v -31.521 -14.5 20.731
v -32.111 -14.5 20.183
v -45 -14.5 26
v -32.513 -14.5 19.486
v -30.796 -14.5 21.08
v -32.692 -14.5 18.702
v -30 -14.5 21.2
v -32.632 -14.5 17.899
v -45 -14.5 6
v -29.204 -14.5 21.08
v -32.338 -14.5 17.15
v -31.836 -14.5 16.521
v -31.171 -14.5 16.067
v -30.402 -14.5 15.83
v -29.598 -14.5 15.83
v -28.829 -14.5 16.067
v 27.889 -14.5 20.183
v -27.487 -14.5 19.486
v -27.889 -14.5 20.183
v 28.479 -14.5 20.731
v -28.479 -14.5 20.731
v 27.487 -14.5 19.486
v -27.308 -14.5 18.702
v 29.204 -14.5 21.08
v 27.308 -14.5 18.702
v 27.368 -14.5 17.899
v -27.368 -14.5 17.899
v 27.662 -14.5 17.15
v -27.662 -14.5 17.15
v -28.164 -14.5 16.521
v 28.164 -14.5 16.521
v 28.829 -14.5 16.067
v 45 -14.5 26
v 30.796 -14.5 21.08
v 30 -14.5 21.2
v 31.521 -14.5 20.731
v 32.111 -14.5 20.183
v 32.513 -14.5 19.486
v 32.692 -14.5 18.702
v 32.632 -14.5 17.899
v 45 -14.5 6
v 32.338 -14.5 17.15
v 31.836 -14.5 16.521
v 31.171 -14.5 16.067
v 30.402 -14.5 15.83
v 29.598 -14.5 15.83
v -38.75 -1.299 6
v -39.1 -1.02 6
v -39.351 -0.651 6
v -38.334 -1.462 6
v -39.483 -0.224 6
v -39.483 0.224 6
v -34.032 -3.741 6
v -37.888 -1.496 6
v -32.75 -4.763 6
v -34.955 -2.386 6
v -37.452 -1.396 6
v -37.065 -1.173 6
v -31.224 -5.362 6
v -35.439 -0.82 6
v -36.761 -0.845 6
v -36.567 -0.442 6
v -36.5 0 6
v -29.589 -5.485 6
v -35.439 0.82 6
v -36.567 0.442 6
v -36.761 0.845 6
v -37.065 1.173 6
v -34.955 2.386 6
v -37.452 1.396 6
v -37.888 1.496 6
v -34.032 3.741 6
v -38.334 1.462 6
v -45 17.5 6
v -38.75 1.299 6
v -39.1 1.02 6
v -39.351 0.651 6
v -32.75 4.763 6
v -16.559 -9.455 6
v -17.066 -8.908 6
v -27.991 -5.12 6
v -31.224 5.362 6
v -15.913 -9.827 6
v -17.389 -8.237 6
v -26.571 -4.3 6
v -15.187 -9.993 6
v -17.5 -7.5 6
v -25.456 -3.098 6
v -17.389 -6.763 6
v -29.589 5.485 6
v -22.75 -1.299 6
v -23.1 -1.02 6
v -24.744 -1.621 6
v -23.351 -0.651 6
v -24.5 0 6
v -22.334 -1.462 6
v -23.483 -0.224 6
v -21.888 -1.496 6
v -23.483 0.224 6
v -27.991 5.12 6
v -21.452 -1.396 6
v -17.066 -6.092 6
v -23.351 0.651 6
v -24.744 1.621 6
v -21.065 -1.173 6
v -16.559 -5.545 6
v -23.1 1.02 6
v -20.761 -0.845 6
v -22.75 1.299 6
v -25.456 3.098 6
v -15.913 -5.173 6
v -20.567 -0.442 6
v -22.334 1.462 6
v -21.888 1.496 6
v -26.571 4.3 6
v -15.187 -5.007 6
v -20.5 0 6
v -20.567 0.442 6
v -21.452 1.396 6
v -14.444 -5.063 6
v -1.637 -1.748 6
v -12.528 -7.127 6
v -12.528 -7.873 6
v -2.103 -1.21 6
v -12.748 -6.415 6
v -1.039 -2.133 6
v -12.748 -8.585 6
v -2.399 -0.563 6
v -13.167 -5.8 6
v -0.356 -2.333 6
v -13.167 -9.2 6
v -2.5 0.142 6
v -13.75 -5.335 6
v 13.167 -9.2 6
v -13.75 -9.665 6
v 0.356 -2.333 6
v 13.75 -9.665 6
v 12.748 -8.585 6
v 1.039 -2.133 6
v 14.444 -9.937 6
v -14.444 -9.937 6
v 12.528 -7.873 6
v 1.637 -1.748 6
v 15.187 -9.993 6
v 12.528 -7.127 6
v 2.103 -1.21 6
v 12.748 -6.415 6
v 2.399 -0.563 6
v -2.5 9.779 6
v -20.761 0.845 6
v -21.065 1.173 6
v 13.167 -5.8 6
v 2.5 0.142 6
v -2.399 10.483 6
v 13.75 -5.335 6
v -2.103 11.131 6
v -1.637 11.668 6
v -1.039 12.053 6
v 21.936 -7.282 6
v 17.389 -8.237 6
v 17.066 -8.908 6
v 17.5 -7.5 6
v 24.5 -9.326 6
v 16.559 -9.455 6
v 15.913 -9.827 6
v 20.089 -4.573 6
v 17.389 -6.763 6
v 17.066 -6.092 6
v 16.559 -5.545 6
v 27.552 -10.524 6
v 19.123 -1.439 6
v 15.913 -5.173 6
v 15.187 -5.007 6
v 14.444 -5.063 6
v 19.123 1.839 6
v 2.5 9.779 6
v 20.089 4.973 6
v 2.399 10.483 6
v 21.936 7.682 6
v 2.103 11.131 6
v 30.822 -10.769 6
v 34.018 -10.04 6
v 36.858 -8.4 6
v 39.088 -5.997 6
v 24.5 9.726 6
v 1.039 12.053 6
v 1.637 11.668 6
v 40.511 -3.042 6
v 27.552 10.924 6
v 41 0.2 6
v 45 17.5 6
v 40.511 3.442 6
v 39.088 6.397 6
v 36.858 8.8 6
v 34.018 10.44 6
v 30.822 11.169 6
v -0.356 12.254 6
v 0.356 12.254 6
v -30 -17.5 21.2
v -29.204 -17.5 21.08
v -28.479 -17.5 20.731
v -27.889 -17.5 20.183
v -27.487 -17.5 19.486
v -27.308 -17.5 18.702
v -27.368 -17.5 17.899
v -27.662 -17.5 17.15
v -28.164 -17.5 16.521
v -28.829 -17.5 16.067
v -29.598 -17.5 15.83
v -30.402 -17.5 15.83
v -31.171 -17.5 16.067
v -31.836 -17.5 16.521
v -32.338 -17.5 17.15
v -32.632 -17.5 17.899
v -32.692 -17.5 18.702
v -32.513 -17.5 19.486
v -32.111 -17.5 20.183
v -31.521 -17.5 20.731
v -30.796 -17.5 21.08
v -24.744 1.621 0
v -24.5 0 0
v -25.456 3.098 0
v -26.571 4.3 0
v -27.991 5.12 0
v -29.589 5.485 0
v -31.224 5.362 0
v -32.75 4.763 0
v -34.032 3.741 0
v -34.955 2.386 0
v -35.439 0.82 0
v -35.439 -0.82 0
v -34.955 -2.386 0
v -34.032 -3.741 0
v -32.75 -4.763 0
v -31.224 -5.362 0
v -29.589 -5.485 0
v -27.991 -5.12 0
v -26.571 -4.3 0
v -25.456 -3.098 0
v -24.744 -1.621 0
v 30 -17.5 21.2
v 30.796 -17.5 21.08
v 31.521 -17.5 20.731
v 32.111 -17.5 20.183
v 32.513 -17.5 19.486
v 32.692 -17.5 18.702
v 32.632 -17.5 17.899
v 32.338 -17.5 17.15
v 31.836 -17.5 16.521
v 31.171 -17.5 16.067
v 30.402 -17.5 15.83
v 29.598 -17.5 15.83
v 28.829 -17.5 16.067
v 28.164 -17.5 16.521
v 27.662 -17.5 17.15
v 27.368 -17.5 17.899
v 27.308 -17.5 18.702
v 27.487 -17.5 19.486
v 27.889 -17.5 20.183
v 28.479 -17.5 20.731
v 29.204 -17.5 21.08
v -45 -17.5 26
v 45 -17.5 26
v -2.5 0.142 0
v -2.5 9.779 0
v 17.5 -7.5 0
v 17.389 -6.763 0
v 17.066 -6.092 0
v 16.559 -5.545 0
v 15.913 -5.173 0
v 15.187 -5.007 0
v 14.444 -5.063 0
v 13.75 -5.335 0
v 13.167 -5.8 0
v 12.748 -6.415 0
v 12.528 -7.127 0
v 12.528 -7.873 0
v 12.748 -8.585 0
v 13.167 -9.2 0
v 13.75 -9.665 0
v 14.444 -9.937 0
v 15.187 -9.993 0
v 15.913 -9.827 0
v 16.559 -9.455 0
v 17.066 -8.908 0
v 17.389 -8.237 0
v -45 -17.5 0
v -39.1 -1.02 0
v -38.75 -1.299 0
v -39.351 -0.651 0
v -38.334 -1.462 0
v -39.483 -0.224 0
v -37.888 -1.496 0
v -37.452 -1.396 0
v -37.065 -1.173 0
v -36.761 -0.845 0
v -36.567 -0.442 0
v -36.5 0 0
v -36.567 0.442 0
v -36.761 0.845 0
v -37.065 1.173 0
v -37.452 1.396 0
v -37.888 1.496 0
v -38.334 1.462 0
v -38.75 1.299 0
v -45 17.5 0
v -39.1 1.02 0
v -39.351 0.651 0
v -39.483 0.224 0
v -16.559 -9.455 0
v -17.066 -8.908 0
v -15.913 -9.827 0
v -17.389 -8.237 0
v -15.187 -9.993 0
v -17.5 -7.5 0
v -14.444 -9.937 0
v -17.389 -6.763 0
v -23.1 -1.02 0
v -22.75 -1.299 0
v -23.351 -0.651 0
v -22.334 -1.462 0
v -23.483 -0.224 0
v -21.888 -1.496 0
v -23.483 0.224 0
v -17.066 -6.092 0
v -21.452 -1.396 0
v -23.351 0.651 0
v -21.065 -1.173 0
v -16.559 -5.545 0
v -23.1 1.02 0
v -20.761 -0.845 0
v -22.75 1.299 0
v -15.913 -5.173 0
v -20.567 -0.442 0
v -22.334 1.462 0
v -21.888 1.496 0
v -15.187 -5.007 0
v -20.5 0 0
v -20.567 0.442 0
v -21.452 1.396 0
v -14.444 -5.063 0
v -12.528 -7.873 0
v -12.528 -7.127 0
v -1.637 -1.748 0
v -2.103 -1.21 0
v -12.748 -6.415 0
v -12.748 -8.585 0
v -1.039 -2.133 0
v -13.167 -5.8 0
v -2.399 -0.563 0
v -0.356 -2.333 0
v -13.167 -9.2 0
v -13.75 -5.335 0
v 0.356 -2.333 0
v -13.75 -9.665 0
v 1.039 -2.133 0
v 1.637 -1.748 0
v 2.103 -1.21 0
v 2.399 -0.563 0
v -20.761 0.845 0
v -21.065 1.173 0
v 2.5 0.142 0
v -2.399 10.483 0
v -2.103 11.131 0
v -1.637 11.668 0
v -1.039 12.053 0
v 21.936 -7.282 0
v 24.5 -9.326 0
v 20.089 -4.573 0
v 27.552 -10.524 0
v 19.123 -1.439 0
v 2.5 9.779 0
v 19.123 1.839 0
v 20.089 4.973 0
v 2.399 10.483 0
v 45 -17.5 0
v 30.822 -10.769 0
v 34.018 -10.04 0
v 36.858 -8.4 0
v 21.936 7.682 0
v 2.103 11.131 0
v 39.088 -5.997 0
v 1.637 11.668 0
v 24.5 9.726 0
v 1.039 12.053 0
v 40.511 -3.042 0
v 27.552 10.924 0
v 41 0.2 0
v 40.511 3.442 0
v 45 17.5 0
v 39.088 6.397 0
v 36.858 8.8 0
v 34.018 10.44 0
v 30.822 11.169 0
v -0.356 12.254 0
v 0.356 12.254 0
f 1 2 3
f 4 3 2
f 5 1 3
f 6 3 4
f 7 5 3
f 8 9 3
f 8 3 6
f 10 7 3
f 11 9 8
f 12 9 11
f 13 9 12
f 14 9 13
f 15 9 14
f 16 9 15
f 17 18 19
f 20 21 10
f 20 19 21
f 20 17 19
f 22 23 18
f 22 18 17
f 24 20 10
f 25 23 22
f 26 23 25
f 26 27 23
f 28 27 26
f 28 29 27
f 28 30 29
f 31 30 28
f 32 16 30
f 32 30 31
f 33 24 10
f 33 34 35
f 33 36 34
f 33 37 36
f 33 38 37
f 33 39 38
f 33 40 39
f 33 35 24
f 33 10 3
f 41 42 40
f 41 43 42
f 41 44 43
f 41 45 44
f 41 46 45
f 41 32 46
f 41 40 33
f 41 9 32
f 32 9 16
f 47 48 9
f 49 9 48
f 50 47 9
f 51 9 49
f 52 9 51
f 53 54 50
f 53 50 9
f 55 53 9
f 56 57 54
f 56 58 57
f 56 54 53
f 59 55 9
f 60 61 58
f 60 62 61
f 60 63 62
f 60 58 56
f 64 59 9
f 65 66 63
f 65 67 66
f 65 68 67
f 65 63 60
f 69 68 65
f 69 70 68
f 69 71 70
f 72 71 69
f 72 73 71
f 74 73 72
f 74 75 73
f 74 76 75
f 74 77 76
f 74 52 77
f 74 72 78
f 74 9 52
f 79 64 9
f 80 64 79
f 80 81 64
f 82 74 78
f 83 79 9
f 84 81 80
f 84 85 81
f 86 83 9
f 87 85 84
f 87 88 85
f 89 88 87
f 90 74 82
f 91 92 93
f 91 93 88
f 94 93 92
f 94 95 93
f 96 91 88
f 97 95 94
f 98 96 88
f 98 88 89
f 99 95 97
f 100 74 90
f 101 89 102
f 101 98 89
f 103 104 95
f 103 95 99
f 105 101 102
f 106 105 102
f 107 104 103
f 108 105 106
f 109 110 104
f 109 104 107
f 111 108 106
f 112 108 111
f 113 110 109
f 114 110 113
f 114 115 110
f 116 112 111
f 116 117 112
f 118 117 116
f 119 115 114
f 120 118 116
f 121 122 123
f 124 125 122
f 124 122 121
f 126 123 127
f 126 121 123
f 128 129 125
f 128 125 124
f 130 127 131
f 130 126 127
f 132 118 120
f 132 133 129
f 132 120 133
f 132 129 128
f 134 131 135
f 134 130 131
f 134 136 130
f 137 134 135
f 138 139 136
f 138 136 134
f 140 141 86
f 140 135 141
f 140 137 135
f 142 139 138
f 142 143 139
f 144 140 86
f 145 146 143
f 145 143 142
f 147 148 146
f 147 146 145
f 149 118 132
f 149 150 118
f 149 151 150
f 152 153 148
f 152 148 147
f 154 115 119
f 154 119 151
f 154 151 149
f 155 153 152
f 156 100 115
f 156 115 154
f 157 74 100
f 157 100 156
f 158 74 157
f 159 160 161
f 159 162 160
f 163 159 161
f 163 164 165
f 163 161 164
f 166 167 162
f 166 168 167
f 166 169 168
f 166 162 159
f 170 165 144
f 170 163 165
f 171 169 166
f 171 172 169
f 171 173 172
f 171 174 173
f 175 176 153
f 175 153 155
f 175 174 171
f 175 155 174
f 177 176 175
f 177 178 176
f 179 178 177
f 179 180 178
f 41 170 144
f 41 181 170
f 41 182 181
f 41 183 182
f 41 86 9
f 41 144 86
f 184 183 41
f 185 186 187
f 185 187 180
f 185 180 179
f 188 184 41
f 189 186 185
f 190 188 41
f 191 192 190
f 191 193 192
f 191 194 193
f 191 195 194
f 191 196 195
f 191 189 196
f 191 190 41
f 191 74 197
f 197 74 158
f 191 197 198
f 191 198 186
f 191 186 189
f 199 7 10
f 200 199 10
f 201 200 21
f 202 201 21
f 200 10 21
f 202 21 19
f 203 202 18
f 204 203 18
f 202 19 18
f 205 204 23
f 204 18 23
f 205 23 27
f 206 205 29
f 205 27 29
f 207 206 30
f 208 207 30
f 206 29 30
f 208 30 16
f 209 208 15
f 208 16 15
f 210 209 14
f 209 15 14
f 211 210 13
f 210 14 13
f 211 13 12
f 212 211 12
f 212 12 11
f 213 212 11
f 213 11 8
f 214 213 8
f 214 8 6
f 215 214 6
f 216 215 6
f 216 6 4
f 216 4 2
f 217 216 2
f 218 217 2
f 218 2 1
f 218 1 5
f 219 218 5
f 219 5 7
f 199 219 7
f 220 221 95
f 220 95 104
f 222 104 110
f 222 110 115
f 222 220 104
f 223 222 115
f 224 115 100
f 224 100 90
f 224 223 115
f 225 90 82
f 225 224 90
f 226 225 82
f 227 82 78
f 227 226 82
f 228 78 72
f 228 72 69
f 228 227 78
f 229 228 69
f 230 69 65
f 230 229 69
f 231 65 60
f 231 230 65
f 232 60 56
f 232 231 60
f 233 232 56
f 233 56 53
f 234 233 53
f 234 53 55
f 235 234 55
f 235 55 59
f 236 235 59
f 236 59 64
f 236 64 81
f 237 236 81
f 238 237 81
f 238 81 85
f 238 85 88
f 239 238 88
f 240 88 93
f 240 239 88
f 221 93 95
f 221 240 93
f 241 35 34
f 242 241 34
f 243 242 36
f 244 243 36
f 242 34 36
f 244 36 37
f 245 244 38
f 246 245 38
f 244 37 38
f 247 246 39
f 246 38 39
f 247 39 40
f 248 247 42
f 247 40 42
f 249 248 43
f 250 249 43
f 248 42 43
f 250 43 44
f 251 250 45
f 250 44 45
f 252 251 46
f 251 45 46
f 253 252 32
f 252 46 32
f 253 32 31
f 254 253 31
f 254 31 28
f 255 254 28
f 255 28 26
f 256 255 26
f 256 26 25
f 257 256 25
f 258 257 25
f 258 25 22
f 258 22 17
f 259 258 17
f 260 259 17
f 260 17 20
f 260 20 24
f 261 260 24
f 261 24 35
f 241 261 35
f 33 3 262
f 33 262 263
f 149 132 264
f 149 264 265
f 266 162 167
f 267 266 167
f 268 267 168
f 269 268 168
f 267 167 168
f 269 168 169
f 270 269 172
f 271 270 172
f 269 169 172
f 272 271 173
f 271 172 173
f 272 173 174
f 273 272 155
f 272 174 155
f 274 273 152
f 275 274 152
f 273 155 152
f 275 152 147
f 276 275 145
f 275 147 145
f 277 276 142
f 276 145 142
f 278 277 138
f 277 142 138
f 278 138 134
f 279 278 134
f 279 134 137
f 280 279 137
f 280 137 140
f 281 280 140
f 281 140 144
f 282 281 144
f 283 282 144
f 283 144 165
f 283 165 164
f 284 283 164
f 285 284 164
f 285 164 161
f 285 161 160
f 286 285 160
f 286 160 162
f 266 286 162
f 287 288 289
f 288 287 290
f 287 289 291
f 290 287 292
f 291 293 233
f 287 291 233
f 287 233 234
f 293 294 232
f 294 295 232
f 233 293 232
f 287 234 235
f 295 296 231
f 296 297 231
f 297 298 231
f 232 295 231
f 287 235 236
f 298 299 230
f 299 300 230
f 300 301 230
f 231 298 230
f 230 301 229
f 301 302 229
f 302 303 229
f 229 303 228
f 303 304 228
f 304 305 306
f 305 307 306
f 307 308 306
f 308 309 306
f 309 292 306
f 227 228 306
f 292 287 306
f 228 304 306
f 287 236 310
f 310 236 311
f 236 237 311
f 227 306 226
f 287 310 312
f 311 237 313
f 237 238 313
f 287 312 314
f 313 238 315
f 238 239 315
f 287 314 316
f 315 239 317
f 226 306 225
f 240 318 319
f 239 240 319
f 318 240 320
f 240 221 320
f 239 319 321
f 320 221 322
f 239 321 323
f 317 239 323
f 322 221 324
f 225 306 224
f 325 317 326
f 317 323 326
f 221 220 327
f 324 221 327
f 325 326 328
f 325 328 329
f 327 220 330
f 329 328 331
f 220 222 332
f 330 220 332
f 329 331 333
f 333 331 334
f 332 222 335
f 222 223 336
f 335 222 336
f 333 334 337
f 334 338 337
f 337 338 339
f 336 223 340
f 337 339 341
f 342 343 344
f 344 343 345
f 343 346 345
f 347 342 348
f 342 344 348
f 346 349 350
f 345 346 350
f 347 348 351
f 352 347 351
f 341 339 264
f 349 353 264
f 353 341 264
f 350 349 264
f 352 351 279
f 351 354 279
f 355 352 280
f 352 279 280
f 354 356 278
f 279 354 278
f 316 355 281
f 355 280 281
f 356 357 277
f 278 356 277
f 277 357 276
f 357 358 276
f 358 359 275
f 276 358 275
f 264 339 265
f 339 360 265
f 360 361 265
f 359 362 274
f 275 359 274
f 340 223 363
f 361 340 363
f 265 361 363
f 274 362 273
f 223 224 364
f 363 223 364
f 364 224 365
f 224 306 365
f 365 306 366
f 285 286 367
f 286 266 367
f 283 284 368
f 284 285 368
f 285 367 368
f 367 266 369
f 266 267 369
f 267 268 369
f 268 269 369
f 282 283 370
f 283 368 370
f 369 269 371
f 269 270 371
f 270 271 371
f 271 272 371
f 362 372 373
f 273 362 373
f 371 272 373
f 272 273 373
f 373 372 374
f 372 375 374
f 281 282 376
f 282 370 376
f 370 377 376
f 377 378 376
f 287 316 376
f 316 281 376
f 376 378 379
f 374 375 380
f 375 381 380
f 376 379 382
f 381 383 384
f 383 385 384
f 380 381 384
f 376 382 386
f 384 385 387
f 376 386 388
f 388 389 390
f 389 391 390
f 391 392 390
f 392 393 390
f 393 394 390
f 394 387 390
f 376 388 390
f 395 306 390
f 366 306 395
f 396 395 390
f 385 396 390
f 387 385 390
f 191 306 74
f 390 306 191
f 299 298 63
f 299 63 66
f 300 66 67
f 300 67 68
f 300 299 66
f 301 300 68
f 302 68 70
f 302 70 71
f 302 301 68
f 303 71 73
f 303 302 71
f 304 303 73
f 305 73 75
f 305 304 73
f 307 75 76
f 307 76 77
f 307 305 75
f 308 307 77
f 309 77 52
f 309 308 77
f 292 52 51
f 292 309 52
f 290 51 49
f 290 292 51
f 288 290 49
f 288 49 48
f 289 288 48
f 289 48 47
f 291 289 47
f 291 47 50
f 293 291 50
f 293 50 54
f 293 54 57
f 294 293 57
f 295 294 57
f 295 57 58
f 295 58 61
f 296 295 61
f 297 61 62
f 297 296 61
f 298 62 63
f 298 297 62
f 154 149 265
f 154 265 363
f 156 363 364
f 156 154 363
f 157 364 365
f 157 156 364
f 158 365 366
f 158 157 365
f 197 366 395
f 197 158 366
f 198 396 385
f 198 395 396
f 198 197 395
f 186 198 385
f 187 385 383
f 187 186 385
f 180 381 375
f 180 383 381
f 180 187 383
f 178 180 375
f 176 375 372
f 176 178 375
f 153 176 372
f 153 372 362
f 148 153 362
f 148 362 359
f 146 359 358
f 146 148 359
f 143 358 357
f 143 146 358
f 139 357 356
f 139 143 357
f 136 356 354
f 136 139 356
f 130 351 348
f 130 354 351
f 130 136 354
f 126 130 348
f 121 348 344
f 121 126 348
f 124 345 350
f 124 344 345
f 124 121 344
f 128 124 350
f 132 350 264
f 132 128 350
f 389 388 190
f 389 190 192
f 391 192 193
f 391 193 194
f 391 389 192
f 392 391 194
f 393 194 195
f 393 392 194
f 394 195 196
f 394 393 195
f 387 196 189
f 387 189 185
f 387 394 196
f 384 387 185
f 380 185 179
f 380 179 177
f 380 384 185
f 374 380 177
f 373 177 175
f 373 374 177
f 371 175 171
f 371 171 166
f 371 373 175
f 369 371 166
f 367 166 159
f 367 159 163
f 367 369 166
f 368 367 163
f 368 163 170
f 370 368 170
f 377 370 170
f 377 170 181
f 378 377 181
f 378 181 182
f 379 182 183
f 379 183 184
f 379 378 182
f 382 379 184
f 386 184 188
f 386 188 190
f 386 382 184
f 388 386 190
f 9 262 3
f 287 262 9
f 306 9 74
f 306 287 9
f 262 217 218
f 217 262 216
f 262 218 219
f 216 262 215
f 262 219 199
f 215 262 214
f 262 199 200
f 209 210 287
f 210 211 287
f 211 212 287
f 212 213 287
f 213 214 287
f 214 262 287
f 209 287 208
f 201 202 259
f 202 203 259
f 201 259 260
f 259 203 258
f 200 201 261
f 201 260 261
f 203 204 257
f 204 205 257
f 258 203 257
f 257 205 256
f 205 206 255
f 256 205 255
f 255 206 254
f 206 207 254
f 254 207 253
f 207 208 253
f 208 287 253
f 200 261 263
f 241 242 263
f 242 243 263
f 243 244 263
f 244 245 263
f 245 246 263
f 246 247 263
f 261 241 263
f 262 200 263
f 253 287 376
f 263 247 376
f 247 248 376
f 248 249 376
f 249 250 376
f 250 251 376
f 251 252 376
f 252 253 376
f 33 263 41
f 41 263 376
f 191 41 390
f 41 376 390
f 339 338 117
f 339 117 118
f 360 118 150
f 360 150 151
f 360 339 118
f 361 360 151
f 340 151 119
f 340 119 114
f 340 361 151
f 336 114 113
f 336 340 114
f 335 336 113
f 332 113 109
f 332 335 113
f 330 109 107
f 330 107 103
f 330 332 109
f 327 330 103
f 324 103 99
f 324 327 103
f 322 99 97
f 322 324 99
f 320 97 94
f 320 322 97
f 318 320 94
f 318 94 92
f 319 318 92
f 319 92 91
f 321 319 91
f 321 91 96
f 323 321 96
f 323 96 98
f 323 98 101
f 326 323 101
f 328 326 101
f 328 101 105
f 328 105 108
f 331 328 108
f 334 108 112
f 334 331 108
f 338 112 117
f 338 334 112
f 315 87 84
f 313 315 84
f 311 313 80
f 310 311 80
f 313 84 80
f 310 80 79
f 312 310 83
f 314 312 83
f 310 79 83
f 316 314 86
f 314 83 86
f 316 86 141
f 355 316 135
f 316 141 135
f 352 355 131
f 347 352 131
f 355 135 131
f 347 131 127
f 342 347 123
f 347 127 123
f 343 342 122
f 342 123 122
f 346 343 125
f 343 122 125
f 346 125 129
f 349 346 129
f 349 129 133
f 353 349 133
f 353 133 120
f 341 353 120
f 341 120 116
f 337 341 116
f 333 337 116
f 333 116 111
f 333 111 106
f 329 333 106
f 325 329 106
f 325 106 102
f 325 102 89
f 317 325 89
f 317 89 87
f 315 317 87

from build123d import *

# Parameters (mm, degrees)
SKETCH1_W           = 90
SKETCH1_H           = 35
SKETCH1_R           = 5.5
SKETCH1_R_2         = 1.5
SKETCH1_R_3         = 11
BOSS_EXTRUDE1_DEPTH = 6
SKETCH2_W           = 90
SKETCH2_H           = 3
BOSS_EXTRUDE2_DEPTH = 20
SKETCH4_R           = 2.5
CUT_EXTRUDE1_DEPTH  = 10
SKETCH5_R           = 2.7
CUT_EXTRUDE2_DEPTH  = 10


with BuildPart() as part:
    # Sketch1 → Boss-Extrude1 (new body)
    with BuildSketch(Plane.XY):
        Rectangle(SKETCH1_W, SKETCH1_H)
        with Locations((-30, 0)):
            Circle(SKETCH1_R, mode=Mode.SUBTRACT)
        with Locations((-38, 0)):
            Circle(SKETCH1_R_2, mode=Mode.SUBTRACT)
        with Locations((-22, 0)):
            Circle(SKETCH1_R_2, mode=Mode.SUBTRACT)
        with Locations((29.999666666, 0.2)):
            Circle(SKETCH1_R_3, mode=Mode.SUBTRACT)
    extrude(amount=BOSS_EXTRUDE1_DEPTH)

    # Sketch2 → Boss-Extrude2 (add)
    with BuildSketch(Plane.XY.offset(6)):
        with Locations((0, -16)):
            Rectangle(SKETCH2_W, SKETCH2_H)
    extrude(amount=BOSS_EXTRUDE2_DEPTH)

    # Sketch4 → Cut-Extrude1 (cut)
    with BuildSketch(Plane.XY.offset(6)):
        with Locations((15, -7.5)):
            Circle(SKETCH4_R)
        with Locations(Location((-15, -7.5, 0), (0, 0, 180))):
            Circle(SKETCH4_R)
        with BuildLine():
            Line((2.5, 9.778989608), (2.5, 0.141519694))
            ThreePointArc((2.5, 0.141519694), (0, -2.358480306), (-2.5, 0.141519694))
            Line((-2.5, 0.141519694), (-2.5, 9.778989608))
            ThreePointArc((-2.5, 9.778989608), (0, 12.278989608), (2.5, 9.778989608))
        make_face()
    extrude(amount=-CUT_EXTRUDE1_DEPTH, mode=Mode.SUBTRACT)

    # Sketch5 → Cut-Extrude2 (cut)
    with BuildSketch(Plane(origin=(0, -14.5, 0), x_dir=(1, 0, 0), z_dir=(0, 1, 0))):
        with Locations(Location((30, -18.5, 0), (0, 0, 270))):
            Circle(SKETCH5_R)
        with Locations(Location((-30, -18.5, 0), (0, 0, 270))):
            Circle(SKETCH5_R)
    extrude(amount=-CUT_EXTRUDE2_DEPTH, mode=Mode.SUBTRACT)


solid = part.part
